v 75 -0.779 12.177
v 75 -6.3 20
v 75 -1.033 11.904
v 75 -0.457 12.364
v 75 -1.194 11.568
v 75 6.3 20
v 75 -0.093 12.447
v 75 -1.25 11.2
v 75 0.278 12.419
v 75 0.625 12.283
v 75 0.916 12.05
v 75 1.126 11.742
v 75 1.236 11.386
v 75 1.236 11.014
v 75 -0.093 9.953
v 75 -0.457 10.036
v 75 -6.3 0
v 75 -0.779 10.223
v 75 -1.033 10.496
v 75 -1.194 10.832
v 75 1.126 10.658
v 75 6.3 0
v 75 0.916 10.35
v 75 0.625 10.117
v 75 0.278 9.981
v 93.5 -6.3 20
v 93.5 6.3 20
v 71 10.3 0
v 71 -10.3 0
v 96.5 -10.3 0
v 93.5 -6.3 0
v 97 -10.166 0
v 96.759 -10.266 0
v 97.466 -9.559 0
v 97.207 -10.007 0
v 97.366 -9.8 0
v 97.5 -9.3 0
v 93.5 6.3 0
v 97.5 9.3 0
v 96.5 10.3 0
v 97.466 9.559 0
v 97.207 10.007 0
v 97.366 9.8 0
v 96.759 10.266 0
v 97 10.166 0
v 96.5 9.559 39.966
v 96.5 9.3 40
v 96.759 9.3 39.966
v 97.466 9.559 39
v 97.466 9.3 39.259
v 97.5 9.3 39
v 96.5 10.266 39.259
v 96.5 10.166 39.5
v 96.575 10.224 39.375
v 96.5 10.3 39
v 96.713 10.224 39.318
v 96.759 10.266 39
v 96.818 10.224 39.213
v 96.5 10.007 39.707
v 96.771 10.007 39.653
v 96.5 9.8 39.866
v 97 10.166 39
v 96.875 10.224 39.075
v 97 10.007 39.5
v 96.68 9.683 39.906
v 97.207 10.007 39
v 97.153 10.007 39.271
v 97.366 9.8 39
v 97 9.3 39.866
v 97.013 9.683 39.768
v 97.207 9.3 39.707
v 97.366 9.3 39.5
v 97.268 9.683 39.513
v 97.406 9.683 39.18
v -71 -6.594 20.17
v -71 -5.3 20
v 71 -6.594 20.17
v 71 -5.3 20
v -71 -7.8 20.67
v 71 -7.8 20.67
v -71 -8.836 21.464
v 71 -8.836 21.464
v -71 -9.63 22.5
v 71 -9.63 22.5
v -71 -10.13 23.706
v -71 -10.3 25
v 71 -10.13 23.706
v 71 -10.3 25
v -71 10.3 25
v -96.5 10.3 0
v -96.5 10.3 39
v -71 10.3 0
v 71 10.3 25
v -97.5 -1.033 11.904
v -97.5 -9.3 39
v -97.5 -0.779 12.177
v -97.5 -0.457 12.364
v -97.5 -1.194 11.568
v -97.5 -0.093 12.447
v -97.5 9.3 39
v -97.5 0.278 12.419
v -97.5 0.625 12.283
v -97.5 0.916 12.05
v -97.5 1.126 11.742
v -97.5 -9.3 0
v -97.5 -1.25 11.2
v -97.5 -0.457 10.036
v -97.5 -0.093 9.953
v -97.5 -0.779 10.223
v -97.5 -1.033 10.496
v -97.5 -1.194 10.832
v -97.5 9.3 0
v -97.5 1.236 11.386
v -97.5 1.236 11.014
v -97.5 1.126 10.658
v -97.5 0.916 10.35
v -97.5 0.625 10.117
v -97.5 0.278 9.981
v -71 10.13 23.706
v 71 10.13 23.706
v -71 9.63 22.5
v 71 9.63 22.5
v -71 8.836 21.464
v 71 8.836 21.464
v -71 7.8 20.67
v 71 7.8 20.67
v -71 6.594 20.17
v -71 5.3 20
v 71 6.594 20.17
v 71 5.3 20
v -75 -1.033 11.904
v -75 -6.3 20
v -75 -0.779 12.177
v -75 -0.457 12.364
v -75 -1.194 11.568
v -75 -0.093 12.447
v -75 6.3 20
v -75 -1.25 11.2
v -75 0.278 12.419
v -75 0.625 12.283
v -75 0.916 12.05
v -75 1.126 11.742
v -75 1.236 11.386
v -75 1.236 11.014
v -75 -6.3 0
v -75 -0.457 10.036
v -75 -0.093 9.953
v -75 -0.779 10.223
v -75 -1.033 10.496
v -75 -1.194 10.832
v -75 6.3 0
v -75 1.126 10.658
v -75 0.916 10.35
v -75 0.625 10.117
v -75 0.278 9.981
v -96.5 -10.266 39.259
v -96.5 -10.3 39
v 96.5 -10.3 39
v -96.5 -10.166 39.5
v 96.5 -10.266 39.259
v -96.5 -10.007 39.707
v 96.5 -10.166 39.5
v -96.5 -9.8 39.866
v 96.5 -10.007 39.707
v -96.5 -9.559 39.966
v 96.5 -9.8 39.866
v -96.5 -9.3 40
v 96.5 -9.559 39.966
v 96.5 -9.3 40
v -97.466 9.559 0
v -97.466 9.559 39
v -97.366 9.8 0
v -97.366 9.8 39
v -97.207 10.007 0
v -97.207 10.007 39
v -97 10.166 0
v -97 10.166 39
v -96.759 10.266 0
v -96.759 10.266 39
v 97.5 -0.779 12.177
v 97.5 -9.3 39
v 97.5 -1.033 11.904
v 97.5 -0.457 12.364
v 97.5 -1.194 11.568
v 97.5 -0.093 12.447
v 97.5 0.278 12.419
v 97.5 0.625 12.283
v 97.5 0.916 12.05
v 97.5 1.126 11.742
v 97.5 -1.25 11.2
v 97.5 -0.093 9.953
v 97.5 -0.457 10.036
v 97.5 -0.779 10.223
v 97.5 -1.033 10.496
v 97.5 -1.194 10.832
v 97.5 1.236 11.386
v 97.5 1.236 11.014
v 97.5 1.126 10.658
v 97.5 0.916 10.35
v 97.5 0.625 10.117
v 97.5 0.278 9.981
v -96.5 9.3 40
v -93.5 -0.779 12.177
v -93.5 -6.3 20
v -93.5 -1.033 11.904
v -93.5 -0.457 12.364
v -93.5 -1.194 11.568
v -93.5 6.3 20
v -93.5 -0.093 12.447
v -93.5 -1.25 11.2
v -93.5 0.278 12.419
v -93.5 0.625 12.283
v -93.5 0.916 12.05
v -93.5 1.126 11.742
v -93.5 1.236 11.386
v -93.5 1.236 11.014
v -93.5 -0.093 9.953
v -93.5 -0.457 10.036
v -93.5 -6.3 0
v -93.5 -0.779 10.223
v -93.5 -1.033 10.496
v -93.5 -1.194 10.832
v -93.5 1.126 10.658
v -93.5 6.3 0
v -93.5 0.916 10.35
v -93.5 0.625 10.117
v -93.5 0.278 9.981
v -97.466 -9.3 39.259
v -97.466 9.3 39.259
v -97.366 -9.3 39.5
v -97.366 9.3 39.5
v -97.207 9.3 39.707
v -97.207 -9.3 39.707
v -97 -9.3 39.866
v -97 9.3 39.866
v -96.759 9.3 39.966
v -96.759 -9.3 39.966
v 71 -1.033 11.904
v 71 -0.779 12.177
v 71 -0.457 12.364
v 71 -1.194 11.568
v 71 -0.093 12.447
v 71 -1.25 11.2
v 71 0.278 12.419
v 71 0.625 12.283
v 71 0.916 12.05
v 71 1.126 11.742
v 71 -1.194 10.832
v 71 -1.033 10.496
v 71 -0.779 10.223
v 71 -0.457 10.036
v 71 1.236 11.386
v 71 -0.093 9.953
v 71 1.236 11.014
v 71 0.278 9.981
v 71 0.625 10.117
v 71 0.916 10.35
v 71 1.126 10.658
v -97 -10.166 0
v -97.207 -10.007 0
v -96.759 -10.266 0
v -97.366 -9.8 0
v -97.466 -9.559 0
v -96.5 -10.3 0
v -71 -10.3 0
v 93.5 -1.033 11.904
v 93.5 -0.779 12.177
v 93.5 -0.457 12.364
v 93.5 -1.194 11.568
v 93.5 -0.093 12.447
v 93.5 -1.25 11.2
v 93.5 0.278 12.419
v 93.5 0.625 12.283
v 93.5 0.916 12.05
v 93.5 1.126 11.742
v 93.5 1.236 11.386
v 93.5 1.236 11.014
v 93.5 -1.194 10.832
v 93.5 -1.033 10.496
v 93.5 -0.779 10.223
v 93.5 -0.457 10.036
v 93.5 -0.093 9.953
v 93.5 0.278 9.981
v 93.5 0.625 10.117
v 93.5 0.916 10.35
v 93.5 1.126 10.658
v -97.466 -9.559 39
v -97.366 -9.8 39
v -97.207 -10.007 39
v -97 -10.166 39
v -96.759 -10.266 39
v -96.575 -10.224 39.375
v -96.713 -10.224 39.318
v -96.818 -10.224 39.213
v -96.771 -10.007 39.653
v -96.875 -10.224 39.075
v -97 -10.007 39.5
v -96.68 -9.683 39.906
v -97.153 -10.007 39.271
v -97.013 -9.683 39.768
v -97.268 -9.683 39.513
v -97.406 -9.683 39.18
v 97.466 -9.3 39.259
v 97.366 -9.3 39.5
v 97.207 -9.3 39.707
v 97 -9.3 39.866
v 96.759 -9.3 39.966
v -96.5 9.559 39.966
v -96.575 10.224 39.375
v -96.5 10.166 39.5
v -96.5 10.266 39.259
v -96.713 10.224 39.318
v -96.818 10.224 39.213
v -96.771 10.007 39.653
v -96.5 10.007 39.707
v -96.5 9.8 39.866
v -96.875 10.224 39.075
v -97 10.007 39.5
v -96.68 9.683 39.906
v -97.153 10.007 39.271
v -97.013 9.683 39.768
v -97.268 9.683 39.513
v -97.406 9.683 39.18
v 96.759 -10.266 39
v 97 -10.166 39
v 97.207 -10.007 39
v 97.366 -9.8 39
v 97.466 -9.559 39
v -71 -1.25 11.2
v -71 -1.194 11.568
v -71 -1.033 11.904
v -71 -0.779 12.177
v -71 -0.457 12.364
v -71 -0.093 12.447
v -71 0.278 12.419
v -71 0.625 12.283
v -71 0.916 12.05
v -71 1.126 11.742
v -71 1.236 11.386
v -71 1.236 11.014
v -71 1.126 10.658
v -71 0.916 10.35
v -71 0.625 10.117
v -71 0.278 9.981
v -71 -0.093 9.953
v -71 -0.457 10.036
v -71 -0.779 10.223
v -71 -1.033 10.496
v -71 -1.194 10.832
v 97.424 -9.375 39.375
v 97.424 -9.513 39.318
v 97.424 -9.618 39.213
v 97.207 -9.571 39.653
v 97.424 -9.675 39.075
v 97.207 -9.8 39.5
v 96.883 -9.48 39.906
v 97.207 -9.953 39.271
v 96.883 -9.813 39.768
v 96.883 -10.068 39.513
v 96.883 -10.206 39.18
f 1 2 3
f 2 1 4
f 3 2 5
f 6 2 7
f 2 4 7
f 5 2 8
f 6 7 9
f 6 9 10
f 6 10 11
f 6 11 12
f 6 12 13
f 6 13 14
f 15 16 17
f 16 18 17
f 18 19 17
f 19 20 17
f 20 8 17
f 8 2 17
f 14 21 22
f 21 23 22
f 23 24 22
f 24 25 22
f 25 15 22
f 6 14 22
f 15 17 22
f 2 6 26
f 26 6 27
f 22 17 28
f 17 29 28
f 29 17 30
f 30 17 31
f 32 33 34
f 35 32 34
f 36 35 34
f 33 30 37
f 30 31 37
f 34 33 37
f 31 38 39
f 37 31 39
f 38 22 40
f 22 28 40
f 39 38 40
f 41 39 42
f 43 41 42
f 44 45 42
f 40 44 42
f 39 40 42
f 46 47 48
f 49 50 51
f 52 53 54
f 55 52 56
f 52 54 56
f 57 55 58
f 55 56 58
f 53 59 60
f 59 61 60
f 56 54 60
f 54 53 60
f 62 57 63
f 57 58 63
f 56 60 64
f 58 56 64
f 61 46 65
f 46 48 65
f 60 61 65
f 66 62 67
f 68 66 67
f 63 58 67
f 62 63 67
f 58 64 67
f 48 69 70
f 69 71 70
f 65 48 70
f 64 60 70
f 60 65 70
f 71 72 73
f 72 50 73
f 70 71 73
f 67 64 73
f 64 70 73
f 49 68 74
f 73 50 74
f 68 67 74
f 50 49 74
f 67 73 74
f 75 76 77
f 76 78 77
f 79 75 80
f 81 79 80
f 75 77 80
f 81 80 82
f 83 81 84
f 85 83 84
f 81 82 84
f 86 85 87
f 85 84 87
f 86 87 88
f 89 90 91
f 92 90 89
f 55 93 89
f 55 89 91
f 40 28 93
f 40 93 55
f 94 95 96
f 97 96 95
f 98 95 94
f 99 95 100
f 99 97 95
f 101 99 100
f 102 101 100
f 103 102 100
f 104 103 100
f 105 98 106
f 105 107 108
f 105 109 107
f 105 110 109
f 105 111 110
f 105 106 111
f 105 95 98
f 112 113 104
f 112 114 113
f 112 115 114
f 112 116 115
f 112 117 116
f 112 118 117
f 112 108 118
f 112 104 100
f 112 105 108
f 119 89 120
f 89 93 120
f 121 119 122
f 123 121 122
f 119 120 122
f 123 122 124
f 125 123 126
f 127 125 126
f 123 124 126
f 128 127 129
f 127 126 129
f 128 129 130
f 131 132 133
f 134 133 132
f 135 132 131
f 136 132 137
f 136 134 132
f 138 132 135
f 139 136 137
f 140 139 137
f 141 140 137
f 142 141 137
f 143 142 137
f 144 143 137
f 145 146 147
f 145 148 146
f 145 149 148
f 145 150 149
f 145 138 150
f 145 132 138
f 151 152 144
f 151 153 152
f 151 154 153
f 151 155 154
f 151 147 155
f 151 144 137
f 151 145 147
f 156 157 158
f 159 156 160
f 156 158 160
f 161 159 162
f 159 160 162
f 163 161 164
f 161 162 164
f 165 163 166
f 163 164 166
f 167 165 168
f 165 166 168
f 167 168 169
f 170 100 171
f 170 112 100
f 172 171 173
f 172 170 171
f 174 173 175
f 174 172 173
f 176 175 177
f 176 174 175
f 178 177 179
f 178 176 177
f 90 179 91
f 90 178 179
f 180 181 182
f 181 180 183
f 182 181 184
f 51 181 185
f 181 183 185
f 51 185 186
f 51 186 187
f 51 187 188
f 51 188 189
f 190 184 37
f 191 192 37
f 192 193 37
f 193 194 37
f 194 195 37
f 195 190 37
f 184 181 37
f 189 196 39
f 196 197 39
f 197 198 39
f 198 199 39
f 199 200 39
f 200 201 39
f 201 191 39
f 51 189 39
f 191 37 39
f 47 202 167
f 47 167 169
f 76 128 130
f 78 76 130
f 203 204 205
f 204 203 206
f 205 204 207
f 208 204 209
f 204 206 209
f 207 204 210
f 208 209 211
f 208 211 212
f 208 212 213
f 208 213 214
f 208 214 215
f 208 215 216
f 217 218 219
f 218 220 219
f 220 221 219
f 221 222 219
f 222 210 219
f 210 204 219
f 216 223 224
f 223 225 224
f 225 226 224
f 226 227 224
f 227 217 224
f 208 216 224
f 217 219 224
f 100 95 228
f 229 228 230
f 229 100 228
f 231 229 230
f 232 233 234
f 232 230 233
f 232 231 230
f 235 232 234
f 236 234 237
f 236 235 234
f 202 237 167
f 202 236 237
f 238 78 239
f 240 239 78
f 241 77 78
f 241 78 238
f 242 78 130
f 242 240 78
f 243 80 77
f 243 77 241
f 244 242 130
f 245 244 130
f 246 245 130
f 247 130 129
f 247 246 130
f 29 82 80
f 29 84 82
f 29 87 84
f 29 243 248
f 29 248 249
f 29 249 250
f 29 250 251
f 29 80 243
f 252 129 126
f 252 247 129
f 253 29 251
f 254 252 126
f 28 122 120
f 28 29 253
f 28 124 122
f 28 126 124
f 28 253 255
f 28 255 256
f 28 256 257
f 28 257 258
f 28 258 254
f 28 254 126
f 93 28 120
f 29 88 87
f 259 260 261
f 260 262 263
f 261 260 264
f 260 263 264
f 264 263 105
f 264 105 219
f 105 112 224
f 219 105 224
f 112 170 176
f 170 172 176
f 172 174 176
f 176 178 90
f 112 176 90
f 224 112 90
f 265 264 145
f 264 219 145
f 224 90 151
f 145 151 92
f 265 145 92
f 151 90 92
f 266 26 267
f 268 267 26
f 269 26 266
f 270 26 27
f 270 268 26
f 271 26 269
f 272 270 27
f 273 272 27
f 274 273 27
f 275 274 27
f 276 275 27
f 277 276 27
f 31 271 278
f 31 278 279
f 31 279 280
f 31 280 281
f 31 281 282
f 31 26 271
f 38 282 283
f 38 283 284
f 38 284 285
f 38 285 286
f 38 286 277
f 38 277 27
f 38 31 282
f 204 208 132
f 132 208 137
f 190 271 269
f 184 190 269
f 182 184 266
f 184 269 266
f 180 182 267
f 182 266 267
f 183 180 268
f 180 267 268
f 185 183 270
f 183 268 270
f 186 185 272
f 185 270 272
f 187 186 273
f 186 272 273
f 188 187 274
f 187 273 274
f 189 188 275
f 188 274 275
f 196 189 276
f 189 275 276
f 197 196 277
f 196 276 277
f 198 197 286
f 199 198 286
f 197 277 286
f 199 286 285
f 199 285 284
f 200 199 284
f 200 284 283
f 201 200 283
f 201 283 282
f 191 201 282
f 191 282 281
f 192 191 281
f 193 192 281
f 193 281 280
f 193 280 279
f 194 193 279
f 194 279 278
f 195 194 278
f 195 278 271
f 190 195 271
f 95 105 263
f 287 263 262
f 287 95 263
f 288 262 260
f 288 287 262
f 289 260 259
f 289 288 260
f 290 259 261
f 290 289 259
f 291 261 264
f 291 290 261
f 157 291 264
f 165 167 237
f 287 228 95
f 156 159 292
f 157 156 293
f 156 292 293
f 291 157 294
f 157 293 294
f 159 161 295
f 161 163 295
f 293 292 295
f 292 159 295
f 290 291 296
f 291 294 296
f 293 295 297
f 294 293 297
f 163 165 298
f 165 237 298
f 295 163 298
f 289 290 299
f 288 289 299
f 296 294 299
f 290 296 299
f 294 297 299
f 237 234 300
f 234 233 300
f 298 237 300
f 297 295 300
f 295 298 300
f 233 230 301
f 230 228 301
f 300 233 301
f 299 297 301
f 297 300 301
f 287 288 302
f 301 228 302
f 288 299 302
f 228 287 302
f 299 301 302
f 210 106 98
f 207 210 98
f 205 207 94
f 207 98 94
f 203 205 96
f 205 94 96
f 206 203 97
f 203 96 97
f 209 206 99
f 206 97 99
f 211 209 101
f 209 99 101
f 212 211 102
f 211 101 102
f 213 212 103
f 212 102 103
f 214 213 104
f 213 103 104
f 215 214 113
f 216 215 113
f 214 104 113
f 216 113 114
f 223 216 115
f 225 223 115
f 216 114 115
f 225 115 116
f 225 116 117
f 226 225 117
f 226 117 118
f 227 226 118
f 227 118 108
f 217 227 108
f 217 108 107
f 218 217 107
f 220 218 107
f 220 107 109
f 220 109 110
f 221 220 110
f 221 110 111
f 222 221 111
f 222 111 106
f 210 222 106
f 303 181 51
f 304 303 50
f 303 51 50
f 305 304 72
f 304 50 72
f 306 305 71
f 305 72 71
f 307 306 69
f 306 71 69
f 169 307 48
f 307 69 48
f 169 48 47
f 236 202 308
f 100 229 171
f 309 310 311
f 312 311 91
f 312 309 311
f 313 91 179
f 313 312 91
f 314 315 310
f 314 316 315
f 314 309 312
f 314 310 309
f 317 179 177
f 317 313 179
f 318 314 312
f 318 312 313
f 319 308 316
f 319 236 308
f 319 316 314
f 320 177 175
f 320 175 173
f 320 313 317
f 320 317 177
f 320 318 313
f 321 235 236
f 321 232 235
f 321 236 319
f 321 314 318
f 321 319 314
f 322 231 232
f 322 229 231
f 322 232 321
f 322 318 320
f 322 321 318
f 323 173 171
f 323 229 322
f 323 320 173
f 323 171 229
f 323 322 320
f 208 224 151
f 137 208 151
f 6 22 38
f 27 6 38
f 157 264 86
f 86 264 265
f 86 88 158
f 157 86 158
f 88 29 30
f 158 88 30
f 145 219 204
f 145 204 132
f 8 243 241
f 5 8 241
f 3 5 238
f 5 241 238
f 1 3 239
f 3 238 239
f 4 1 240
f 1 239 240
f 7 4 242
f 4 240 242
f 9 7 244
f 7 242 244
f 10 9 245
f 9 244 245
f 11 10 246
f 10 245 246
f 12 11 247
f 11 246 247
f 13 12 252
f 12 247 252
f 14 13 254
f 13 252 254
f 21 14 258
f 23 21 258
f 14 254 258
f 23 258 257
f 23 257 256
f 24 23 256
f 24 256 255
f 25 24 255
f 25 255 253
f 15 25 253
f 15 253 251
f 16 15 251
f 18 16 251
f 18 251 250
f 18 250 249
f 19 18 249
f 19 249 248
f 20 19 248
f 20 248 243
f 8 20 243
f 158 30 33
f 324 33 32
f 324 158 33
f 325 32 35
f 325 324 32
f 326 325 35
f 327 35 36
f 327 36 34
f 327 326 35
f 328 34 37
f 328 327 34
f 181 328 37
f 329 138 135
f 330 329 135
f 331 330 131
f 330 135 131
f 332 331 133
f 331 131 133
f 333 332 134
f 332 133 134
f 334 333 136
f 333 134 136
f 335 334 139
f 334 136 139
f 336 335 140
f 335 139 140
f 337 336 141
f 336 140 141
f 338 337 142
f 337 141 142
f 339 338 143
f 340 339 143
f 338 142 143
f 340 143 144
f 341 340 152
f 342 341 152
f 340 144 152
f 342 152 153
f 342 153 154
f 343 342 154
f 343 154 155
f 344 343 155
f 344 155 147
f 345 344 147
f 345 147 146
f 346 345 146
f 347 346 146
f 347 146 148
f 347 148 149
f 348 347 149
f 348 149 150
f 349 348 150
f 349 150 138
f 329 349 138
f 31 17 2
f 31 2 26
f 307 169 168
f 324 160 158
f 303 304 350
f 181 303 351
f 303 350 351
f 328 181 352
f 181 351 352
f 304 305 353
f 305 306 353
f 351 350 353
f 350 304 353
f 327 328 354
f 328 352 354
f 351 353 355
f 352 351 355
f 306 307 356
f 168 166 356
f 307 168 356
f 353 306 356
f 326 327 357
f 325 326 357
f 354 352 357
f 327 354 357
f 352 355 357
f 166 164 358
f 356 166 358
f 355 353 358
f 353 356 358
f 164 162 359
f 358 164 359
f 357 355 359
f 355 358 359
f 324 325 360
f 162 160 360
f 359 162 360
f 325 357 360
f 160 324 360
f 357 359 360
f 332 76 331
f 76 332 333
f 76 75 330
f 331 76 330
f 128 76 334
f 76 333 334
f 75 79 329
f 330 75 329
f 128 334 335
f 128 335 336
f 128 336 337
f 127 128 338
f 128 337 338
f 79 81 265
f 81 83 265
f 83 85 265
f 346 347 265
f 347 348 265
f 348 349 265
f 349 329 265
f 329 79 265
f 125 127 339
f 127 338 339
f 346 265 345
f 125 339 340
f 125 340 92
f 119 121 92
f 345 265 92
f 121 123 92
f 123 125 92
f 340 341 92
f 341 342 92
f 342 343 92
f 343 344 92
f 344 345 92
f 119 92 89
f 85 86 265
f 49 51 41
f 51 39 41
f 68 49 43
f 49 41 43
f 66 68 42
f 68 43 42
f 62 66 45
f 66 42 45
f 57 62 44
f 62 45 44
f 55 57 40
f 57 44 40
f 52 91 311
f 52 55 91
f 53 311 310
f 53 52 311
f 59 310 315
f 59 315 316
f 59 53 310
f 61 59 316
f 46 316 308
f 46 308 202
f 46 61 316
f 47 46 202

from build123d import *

# Parameters (mm, degrees)
F0_W     = 26.5
F0_H     = 20.6
F0_W_2   = 18.5
F0_H_2   = 12.6
F1_DEPTH = 20
F2_W     = 195
F2_H     = 20.6
F3_DEPTH = 20
F4_R     = 1
F5_R     = 1.25
F6_DEPTH = 2000
F7_R     = 1.25
F8_DEPTH = 100
F9_R     = 5


with BuildPart() as f1:
    # F0 (on Top) → F1 (new body)
    with BuildSketch(Plane.XY):
        with Locations((-84.25, 0)):
            Rectangle(F0_W, F0_H)
        with Locations((-84.25, 0)):
            Rectangle(F0_W_2, F0_H_2, mode=Mode.SUBTRACT)
    extrude(amount=F1_DEPTH)



with BuildPart() as f1b:
    # F0 (on Top) → F1, piece 2 (new body)
    with BuildSketch(Plane.XY):
        with Locations((84.25, 0)):
            Rectangle(F0_W, F0_H)
        with Locations((84.25, 0)):
            Rectangle(F0_W_2, F0_H_2, mode=Mode.SUBTRACT)
    extrude(amount=F1_DEPTH)


with BuildPart() as f1_1:
    add(f1.part)

    add(f1b.part)  # F3 merges F1b
    # F2 (on face) → F3 (join)
    with BuildSketch(Plane.XY.offset(20)):
        Rectangle(F2_W, F2_H)
    extrude(amount=F3_DEPTH)

    # F4
    f4_edges = [f1_1.edges().sort_by_distance(p)[0] for p in [
        (-97.5, 0, 40),
        (0, -10.3, 40),
        (97.5, 0, 40),
        (0, 10.3, 40),
        (-97.5, -10.3, 20),
        (97.5, -10.3, 20),
        (97.5, 10.3, 20),
        (-97.5, 10.3, 20),
    ]]
    fillet(f4_edges, radius=F4_R)

    # F5 (on face) → F6 (cut)
    with BuildSketch(Plane(origin=(-97.5, 0, 0), x_dir=(0, -1, 0), z_dir=(-1, 0, 0))):
        with Locations((0, 11.2)):
            Circle(F5_R)
    extrude(amount=-F6_DEPTH, mode=Mode.SUBTRACT)

    # F7 (on face) → F8 (cut)
    with BuildSketch(Plane.YZ.offset(97.5)):
        with Locations((0, 11.2)):
            Circle(F7_R)
    extrude(amount=-F8_DEPTH, mode=Mode.SUBTRACT)

    # F9
    f9_edges = [f1_1.edges().sort_by_distance(p)[0] for p in [
        (0, 10.3, 20),
        (0, -10.3, 20),
    ]]
    fillet(f9_edges, radius=F9_R)


solid = f1_1.part
